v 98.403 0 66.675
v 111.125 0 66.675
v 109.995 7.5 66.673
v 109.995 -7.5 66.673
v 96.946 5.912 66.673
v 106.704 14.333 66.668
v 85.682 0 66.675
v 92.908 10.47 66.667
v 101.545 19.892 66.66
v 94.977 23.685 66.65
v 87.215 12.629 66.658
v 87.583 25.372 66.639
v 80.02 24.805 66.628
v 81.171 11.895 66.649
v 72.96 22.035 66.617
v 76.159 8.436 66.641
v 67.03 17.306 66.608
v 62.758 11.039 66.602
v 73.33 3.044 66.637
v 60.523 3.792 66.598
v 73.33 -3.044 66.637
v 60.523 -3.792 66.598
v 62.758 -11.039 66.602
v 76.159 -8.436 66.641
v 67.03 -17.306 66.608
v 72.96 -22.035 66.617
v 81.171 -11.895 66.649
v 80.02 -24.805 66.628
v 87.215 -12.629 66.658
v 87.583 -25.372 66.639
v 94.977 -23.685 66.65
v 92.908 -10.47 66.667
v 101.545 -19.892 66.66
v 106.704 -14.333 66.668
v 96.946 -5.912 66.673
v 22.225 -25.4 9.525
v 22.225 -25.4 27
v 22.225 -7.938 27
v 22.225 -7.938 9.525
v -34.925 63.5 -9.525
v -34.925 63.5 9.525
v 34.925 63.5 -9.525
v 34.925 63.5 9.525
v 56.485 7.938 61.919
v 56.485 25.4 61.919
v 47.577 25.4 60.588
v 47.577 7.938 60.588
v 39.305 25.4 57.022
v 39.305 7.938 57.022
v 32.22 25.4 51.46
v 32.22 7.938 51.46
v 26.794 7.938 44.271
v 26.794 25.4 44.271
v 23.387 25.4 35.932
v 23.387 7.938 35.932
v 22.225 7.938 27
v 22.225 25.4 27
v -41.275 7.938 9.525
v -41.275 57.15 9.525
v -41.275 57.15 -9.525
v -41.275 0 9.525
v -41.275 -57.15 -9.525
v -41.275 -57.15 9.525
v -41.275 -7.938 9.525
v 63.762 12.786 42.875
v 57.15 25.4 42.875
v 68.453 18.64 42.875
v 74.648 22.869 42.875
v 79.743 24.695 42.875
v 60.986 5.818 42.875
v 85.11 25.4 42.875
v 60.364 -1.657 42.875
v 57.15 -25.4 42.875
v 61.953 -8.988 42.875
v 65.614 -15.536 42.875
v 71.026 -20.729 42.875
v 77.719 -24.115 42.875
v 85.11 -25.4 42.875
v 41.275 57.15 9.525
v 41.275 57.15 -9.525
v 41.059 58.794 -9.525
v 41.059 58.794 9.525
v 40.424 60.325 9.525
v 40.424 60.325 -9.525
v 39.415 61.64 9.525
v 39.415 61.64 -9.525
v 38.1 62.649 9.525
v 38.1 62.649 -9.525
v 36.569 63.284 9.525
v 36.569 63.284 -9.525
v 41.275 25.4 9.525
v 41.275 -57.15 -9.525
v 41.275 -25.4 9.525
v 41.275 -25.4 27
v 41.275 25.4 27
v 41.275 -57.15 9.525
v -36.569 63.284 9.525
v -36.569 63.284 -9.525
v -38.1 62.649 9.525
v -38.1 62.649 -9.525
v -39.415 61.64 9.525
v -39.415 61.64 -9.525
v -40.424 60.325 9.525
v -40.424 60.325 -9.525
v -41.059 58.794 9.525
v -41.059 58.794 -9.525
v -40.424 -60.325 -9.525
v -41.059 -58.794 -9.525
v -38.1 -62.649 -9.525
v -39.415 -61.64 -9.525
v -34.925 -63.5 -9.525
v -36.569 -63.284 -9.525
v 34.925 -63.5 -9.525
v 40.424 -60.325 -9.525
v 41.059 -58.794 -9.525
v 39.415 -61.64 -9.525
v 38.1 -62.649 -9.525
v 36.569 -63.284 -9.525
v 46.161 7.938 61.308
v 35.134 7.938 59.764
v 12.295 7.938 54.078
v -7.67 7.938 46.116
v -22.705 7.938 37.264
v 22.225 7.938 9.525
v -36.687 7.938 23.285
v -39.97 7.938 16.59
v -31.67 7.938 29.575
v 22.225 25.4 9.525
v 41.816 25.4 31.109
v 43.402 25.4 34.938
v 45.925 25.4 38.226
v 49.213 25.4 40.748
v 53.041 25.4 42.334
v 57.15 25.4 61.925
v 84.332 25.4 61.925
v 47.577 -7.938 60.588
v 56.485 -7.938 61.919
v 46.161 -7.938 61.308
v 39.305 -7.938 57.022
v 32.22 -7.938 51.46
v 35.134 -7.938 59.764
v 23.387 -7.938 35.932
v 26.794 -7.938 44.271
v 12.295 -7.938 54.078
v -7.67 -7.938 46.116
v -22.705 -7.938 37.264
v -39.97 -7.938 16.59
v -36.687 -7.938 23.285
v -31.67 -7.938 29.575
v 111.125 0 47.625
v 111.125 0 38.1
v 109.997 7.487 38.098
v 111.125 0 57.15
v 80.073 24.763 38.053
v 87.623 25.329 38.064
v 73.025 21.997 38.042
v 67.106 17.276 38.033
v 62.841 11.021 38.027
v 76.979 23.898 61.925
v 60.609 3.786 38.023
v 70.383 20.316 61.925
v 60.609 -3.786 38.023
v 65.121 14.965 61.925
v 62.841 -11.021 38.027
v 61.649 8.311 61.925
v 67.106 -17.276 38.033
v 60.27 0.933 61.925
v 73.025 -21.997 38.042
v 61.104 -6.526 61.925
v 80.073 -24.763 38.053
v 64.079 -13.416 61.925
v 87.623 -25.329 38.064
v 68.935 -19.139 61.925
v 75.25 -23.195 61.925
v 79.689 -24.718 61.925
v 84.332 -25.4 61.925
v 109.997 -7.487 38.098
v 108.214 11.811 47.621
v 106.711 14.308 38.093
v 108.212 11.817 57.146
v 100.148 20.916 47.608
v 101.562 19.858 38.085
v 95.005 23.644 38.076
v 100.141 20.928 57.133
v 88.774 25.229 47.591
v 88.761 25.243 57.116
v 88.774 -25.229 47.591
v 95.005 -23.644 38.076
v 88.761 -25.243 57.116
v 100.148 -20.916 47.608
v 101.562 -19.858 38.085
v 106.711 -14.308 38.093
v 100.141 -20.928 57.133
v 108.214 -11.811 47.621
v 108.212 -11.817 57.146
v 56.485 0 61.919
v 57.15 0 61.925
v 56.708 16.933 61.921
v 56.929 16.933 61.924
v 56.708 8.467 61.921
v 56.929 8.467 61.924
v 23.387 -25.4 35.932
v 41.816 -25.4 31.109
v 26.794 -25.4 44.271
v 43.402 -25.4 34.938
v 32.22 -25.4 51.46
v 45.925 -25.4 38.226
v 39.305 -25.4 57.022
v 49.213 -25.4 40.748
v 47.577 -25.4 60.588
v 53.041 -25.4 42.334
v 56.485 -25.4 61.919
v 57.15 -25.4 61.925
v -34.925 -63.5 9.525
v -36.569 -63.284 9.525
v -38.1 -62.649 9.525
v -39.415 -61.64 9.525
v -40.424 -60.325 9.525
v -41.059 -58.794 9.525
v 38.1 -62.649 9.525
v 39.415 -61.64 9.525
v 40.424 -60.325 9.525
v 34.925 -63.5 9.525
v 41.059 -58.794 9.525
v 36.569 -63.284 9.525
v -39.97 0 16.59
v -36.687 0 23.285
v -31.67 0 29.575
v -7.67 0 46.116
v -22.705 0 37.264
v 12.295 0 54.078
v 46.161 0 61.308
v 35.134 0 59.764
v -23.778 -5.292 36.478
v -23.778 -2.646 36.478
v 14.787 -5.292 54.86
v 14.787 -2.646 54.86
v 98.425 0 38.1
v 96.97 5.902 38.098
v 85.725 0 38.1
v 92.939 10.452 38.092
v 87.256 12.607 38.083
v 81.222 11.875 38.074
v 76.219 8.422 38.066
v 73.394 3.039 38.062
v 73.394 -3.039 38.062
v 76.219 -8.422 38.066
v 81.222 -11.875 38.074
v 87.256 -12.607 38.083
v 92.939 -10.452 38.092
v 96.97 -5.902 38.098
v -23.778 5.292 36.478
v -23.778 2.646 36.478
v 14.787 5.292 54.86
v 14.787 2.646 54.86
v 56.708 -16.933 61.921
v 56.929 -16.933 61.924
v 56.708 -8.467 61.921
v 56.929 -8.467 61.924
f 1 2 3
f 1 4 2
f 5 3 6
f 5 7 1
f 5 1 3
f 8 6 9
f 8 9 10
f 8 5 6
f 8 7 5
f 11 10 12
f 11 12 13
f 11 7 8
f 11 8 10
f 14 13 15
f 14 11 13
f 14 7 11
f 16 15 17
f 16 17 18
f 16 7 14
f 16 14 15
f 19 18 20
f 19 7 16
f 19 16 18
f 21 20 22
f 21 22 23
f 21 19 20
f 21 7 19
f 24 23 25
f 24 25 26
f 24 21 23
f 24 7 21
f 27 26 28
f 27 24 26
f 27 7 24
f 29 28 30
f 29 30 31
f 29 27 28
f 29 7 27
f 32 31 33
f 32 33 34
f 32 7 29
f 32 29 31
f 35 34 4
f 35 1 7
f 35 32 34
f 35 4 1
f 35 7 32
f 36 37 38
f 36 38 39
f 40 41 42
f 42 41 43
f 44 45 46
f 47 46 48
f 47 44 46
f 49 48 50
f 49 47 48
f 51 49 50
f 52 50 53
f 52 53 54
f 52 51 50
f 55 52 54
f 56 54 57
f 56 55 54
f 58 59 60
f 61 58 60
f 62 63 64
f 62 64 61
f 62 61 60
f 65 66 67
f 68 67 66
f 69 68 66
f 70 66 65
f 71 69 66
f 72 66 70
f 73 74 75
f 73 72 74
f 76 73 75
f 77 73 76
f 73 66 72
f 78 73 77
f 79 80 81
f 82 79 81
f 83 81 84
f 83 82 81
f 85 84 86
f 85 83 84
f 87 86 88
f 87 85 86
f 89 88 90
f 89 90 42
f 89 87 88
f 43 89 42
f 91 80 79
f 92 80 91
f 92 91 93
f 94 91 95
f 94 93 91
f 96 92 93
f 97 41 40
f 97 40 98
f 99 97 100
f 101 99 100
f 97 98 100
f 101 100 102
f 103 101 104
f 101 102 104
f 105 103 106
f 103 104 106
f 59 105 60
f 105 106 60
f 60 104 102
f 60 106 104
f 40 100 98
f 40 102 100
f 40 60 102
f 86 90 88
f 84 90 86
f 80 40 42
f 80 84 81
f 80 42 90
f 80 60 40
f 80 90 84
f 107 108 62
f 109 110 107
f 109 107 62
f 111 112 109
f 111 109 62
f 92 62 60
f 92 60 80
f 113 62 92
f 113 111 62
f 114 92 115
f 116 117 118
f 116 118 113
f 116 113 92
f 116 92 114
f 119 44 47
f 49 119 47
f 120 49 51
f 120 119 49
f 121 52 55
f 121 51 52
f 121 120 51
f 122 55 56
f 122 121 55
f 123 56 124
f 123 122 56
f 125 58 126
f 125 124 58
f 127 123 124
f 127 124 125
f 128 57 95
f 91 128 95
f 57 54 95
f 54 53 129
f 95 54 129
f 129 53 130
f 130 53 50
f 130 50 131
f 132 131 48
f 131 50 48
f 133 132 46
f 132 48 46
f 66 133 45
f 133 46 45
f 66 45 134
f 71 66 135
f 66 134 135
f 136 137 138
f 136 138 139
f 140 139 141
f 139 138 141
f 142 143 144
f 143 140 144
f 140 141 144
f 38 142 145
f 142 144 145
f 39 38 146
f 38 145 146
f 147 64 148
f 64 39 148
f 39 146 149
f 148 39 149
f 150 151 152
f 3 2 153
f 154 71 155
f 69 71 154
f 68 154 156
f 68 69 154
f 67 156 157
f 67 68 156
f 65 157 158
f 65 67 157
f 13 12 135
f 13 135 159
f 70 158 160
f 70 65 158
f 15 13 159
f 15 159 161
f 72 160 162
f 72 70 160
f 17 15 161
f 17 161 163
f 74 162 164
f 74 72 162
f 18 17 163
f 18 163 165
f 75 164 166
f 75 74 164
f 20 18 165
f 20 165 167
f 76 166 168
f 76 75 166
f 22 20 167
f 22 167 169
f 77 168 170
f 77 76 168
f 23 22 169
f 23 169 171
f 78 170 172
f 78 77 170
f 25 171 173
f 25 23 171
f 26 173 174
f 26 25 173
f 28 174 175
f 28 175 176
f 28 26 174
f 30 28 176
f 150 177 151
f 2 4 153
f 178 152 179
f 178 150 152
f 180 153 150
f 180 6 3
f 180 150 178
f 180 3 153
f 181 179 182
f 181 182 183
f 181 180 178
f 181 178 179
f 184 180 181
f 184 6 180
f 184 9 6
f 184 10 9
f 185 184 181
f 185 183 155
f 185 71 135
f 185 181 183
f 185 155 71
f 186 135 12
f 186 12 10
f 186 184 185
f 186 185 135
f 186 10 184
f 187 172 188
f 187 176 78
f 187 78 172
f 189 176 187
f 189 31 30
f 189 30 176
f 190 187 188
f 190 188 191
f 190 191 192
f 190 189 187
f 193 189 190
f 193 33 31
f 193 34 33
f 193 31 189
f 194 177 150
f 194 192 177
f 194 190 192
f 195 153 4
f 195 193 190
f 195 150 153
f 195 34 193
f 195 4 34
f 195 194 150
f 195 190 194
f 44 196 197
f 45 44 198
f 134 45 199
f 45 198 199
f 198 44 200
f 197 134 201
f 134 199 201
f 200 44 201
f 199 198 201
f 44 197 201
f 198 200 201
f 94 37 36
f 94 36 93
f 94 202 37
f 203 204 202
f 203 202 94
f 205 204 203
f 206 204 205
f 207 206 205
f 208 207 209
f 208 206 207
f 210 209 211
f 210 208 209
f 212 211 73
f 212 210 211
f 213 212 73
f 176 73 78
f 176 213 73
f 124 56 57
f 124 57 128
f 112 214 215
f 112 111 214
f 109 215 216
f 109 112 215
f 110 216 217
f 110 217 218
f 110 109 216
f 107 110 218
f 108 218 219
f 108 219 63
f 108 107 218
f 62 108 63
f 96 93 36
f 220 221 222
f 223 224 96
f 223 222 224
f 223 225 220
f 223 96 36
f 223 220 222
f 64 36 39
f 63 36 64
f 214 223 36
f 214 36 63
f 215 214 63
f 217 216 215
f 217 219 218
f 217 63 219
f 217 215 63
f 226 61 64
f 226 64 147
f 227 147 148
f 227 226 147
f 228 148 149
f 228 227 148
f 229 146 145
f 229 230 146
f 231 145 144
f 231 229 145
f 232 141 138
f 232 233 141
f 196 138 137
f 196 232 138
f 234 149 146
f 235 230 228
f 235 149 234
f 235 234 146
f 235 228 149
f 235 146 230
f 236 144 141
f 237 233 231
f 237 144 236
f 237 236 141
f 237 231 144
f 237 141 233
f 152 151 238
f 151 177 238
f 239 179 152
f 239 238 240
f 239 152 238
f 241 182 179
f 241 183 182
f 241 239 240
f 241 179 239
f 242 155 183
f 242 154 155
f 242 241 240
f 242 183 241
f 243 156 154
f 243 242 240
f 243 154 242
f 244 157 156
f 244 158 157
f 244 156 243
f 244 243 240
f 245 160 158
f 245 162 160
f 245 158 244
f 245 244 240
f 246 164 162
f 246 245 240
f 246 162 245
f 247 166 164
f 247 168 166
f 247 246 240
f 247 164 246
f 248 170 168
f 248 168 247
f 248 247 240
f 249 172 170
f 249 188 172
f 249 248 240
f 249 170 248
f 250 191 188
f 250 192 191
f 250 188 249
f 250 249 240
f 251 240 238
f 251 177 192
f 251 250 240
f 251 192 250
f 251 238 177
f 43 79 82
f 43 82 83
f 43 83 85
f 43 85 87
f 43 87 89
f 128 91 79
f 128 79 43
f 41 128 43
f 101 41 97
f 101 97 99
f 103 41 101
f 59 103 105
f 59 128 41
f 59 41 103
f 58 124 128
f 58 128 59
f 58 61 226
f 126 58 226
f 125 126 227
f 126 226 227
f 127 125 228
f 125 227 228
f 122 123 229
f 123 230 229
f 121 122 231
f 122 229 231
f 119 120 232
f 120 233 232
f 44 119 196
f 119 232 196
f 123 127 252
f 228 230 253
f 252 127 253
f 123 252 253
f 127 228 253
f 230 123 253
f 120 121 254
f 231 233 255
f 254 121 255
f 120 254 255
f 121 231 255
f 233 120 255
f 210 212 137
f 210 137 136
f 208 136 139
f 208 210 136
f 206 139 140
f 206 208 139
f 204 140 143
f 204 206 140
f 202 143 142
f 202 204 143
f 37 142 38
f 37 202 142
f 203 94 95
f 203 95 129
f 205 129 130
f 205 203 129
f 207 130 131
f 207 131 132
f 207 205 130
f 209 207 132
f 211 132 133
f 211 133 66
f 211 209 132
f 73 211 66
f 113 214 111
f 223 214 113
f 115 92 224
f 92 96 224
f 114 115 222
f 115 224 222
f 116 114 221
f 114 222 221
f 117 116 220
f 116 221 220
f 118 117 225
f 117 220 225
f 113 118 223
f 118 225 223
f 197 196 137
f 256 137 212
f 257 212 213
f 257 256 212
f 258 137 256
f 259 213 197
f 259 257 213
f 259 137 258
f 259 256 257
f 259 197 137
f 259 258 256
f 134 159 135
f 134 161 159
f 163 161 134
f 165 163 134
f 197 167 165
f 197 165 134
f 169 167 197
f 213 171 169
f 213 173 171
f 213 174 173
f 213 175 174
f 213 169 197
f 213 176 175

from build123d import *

# Parameters (mm, degrees)
F1_DEPTH = 63.5
F0_W     = 25.347986334
F0_H     = 19.05
F2_DEPTH = 25.4
F3_DEPTH = 7.9375
F5_R     = 6.35


with BuildPart() as f1:
    # F0 (on Front) → F1 (new body, symmetric)
    with BuildSketch(Plane.XZ):
        Polygon((-41.275, 9.525), (-41.275, -9.525), (41.275, -9.525), (41.275, 9.525), (22.225, 9.525), align=None)
    extrude(amount=F1_DEPTH, both=True)

    # F0 (on Front) → F2 (join, symmetric)
    with BuildSketch(Plane.XZ):
        with BuildLine():
            Line((22.225, 9.525), (41.275, 9.525))
            Line((41.275, 9.525), (41.275, 27.0002))
            ThreePointArc((41.275, 27.0002), (45.9246798487, 38.2255201513), (57.15, 42.8752))
            Line((57.15, 42.8752), (60.325, 42.8752))
            Line((60.325, 42.8752), (60.325, 61.9252))
            Line((60.325, 61.9252), (57.15, 61.9252))
            add(Edge.make_bspline(
                [(56.4854564208, 61.9188770487), (56.7077656128, 61.9217360058), (56.9292858392, 61.9238445309), (57.15, 61.9252)],
                knots=[110.8436997421, 110.8436997421, 110.8436997421, 110.8436997421, 111.5045361635, 111.5045361635, 111.5045361635, 111.5045361635], degree=3))
            ThreePointArc((56.4854564208, 61.9188770487), (32.2204511723, 51.4598242868), (22.225, 27.0002))
            Line((22.225, 27.0002), (22.225, 9.525))
        make_face()
        with Locations((72.998993167, 52.4002)):
            Rectangle(F0_W, F0_H)
    extrude(amount=F2_DEPTH, both=True)

    # F0 (on Front) → F3 (join, symmetric)
    with BuildSketch(Plane.XZ):
        with BuildLine():
            add(Edge.make_bspline(
                [(-41.275, 9.525), (-40.2883552222, 39.8470173814), (19.1969951279, 61.4393372205), (56.4854564208, 61.9188770487)],
                knots=[0, 0, 0, 0, 110.8436997421, 110.8436997421, 110.8436997421, 110.8436997421], degree=3))
            Line((-41.275, 9.525), (22.225, 9.525))
            Line((22.225, 9.525), (22.225, 27.0002))
            ThreePointArc((22.225, 27.0002), (32.2204511723, 51.4598242868), (56.4854564208, 61.9188770487))
        make_face()
    extrude(amount=F3_DEPTH, both=True)

    # F0 (on Front) → F4 (revolve)
    with BuildSketch(Plane.XZ):
        Polygon((111.125, 66.675), (85.6816321611, 66.675), (85.725, 38.1), (111.125, 38.1), align=None)
    revolve(axis=Axis((85.7033160806, 0, 52.3875), (-0.0015176829, 0, 0.9999988483)))

    # F5
    f5_edges = [f1.edges().sort_by_distance(p)[0] for p in [
        (41.275, -63.5, 0),
        (-41.275, -63.5, 0),
        (41.275, 63.5, 0),
        (-41.275, 63.5, 0),
    ]]
    fillet(f5_edges, radius=F5_R)


solid = f1.part
